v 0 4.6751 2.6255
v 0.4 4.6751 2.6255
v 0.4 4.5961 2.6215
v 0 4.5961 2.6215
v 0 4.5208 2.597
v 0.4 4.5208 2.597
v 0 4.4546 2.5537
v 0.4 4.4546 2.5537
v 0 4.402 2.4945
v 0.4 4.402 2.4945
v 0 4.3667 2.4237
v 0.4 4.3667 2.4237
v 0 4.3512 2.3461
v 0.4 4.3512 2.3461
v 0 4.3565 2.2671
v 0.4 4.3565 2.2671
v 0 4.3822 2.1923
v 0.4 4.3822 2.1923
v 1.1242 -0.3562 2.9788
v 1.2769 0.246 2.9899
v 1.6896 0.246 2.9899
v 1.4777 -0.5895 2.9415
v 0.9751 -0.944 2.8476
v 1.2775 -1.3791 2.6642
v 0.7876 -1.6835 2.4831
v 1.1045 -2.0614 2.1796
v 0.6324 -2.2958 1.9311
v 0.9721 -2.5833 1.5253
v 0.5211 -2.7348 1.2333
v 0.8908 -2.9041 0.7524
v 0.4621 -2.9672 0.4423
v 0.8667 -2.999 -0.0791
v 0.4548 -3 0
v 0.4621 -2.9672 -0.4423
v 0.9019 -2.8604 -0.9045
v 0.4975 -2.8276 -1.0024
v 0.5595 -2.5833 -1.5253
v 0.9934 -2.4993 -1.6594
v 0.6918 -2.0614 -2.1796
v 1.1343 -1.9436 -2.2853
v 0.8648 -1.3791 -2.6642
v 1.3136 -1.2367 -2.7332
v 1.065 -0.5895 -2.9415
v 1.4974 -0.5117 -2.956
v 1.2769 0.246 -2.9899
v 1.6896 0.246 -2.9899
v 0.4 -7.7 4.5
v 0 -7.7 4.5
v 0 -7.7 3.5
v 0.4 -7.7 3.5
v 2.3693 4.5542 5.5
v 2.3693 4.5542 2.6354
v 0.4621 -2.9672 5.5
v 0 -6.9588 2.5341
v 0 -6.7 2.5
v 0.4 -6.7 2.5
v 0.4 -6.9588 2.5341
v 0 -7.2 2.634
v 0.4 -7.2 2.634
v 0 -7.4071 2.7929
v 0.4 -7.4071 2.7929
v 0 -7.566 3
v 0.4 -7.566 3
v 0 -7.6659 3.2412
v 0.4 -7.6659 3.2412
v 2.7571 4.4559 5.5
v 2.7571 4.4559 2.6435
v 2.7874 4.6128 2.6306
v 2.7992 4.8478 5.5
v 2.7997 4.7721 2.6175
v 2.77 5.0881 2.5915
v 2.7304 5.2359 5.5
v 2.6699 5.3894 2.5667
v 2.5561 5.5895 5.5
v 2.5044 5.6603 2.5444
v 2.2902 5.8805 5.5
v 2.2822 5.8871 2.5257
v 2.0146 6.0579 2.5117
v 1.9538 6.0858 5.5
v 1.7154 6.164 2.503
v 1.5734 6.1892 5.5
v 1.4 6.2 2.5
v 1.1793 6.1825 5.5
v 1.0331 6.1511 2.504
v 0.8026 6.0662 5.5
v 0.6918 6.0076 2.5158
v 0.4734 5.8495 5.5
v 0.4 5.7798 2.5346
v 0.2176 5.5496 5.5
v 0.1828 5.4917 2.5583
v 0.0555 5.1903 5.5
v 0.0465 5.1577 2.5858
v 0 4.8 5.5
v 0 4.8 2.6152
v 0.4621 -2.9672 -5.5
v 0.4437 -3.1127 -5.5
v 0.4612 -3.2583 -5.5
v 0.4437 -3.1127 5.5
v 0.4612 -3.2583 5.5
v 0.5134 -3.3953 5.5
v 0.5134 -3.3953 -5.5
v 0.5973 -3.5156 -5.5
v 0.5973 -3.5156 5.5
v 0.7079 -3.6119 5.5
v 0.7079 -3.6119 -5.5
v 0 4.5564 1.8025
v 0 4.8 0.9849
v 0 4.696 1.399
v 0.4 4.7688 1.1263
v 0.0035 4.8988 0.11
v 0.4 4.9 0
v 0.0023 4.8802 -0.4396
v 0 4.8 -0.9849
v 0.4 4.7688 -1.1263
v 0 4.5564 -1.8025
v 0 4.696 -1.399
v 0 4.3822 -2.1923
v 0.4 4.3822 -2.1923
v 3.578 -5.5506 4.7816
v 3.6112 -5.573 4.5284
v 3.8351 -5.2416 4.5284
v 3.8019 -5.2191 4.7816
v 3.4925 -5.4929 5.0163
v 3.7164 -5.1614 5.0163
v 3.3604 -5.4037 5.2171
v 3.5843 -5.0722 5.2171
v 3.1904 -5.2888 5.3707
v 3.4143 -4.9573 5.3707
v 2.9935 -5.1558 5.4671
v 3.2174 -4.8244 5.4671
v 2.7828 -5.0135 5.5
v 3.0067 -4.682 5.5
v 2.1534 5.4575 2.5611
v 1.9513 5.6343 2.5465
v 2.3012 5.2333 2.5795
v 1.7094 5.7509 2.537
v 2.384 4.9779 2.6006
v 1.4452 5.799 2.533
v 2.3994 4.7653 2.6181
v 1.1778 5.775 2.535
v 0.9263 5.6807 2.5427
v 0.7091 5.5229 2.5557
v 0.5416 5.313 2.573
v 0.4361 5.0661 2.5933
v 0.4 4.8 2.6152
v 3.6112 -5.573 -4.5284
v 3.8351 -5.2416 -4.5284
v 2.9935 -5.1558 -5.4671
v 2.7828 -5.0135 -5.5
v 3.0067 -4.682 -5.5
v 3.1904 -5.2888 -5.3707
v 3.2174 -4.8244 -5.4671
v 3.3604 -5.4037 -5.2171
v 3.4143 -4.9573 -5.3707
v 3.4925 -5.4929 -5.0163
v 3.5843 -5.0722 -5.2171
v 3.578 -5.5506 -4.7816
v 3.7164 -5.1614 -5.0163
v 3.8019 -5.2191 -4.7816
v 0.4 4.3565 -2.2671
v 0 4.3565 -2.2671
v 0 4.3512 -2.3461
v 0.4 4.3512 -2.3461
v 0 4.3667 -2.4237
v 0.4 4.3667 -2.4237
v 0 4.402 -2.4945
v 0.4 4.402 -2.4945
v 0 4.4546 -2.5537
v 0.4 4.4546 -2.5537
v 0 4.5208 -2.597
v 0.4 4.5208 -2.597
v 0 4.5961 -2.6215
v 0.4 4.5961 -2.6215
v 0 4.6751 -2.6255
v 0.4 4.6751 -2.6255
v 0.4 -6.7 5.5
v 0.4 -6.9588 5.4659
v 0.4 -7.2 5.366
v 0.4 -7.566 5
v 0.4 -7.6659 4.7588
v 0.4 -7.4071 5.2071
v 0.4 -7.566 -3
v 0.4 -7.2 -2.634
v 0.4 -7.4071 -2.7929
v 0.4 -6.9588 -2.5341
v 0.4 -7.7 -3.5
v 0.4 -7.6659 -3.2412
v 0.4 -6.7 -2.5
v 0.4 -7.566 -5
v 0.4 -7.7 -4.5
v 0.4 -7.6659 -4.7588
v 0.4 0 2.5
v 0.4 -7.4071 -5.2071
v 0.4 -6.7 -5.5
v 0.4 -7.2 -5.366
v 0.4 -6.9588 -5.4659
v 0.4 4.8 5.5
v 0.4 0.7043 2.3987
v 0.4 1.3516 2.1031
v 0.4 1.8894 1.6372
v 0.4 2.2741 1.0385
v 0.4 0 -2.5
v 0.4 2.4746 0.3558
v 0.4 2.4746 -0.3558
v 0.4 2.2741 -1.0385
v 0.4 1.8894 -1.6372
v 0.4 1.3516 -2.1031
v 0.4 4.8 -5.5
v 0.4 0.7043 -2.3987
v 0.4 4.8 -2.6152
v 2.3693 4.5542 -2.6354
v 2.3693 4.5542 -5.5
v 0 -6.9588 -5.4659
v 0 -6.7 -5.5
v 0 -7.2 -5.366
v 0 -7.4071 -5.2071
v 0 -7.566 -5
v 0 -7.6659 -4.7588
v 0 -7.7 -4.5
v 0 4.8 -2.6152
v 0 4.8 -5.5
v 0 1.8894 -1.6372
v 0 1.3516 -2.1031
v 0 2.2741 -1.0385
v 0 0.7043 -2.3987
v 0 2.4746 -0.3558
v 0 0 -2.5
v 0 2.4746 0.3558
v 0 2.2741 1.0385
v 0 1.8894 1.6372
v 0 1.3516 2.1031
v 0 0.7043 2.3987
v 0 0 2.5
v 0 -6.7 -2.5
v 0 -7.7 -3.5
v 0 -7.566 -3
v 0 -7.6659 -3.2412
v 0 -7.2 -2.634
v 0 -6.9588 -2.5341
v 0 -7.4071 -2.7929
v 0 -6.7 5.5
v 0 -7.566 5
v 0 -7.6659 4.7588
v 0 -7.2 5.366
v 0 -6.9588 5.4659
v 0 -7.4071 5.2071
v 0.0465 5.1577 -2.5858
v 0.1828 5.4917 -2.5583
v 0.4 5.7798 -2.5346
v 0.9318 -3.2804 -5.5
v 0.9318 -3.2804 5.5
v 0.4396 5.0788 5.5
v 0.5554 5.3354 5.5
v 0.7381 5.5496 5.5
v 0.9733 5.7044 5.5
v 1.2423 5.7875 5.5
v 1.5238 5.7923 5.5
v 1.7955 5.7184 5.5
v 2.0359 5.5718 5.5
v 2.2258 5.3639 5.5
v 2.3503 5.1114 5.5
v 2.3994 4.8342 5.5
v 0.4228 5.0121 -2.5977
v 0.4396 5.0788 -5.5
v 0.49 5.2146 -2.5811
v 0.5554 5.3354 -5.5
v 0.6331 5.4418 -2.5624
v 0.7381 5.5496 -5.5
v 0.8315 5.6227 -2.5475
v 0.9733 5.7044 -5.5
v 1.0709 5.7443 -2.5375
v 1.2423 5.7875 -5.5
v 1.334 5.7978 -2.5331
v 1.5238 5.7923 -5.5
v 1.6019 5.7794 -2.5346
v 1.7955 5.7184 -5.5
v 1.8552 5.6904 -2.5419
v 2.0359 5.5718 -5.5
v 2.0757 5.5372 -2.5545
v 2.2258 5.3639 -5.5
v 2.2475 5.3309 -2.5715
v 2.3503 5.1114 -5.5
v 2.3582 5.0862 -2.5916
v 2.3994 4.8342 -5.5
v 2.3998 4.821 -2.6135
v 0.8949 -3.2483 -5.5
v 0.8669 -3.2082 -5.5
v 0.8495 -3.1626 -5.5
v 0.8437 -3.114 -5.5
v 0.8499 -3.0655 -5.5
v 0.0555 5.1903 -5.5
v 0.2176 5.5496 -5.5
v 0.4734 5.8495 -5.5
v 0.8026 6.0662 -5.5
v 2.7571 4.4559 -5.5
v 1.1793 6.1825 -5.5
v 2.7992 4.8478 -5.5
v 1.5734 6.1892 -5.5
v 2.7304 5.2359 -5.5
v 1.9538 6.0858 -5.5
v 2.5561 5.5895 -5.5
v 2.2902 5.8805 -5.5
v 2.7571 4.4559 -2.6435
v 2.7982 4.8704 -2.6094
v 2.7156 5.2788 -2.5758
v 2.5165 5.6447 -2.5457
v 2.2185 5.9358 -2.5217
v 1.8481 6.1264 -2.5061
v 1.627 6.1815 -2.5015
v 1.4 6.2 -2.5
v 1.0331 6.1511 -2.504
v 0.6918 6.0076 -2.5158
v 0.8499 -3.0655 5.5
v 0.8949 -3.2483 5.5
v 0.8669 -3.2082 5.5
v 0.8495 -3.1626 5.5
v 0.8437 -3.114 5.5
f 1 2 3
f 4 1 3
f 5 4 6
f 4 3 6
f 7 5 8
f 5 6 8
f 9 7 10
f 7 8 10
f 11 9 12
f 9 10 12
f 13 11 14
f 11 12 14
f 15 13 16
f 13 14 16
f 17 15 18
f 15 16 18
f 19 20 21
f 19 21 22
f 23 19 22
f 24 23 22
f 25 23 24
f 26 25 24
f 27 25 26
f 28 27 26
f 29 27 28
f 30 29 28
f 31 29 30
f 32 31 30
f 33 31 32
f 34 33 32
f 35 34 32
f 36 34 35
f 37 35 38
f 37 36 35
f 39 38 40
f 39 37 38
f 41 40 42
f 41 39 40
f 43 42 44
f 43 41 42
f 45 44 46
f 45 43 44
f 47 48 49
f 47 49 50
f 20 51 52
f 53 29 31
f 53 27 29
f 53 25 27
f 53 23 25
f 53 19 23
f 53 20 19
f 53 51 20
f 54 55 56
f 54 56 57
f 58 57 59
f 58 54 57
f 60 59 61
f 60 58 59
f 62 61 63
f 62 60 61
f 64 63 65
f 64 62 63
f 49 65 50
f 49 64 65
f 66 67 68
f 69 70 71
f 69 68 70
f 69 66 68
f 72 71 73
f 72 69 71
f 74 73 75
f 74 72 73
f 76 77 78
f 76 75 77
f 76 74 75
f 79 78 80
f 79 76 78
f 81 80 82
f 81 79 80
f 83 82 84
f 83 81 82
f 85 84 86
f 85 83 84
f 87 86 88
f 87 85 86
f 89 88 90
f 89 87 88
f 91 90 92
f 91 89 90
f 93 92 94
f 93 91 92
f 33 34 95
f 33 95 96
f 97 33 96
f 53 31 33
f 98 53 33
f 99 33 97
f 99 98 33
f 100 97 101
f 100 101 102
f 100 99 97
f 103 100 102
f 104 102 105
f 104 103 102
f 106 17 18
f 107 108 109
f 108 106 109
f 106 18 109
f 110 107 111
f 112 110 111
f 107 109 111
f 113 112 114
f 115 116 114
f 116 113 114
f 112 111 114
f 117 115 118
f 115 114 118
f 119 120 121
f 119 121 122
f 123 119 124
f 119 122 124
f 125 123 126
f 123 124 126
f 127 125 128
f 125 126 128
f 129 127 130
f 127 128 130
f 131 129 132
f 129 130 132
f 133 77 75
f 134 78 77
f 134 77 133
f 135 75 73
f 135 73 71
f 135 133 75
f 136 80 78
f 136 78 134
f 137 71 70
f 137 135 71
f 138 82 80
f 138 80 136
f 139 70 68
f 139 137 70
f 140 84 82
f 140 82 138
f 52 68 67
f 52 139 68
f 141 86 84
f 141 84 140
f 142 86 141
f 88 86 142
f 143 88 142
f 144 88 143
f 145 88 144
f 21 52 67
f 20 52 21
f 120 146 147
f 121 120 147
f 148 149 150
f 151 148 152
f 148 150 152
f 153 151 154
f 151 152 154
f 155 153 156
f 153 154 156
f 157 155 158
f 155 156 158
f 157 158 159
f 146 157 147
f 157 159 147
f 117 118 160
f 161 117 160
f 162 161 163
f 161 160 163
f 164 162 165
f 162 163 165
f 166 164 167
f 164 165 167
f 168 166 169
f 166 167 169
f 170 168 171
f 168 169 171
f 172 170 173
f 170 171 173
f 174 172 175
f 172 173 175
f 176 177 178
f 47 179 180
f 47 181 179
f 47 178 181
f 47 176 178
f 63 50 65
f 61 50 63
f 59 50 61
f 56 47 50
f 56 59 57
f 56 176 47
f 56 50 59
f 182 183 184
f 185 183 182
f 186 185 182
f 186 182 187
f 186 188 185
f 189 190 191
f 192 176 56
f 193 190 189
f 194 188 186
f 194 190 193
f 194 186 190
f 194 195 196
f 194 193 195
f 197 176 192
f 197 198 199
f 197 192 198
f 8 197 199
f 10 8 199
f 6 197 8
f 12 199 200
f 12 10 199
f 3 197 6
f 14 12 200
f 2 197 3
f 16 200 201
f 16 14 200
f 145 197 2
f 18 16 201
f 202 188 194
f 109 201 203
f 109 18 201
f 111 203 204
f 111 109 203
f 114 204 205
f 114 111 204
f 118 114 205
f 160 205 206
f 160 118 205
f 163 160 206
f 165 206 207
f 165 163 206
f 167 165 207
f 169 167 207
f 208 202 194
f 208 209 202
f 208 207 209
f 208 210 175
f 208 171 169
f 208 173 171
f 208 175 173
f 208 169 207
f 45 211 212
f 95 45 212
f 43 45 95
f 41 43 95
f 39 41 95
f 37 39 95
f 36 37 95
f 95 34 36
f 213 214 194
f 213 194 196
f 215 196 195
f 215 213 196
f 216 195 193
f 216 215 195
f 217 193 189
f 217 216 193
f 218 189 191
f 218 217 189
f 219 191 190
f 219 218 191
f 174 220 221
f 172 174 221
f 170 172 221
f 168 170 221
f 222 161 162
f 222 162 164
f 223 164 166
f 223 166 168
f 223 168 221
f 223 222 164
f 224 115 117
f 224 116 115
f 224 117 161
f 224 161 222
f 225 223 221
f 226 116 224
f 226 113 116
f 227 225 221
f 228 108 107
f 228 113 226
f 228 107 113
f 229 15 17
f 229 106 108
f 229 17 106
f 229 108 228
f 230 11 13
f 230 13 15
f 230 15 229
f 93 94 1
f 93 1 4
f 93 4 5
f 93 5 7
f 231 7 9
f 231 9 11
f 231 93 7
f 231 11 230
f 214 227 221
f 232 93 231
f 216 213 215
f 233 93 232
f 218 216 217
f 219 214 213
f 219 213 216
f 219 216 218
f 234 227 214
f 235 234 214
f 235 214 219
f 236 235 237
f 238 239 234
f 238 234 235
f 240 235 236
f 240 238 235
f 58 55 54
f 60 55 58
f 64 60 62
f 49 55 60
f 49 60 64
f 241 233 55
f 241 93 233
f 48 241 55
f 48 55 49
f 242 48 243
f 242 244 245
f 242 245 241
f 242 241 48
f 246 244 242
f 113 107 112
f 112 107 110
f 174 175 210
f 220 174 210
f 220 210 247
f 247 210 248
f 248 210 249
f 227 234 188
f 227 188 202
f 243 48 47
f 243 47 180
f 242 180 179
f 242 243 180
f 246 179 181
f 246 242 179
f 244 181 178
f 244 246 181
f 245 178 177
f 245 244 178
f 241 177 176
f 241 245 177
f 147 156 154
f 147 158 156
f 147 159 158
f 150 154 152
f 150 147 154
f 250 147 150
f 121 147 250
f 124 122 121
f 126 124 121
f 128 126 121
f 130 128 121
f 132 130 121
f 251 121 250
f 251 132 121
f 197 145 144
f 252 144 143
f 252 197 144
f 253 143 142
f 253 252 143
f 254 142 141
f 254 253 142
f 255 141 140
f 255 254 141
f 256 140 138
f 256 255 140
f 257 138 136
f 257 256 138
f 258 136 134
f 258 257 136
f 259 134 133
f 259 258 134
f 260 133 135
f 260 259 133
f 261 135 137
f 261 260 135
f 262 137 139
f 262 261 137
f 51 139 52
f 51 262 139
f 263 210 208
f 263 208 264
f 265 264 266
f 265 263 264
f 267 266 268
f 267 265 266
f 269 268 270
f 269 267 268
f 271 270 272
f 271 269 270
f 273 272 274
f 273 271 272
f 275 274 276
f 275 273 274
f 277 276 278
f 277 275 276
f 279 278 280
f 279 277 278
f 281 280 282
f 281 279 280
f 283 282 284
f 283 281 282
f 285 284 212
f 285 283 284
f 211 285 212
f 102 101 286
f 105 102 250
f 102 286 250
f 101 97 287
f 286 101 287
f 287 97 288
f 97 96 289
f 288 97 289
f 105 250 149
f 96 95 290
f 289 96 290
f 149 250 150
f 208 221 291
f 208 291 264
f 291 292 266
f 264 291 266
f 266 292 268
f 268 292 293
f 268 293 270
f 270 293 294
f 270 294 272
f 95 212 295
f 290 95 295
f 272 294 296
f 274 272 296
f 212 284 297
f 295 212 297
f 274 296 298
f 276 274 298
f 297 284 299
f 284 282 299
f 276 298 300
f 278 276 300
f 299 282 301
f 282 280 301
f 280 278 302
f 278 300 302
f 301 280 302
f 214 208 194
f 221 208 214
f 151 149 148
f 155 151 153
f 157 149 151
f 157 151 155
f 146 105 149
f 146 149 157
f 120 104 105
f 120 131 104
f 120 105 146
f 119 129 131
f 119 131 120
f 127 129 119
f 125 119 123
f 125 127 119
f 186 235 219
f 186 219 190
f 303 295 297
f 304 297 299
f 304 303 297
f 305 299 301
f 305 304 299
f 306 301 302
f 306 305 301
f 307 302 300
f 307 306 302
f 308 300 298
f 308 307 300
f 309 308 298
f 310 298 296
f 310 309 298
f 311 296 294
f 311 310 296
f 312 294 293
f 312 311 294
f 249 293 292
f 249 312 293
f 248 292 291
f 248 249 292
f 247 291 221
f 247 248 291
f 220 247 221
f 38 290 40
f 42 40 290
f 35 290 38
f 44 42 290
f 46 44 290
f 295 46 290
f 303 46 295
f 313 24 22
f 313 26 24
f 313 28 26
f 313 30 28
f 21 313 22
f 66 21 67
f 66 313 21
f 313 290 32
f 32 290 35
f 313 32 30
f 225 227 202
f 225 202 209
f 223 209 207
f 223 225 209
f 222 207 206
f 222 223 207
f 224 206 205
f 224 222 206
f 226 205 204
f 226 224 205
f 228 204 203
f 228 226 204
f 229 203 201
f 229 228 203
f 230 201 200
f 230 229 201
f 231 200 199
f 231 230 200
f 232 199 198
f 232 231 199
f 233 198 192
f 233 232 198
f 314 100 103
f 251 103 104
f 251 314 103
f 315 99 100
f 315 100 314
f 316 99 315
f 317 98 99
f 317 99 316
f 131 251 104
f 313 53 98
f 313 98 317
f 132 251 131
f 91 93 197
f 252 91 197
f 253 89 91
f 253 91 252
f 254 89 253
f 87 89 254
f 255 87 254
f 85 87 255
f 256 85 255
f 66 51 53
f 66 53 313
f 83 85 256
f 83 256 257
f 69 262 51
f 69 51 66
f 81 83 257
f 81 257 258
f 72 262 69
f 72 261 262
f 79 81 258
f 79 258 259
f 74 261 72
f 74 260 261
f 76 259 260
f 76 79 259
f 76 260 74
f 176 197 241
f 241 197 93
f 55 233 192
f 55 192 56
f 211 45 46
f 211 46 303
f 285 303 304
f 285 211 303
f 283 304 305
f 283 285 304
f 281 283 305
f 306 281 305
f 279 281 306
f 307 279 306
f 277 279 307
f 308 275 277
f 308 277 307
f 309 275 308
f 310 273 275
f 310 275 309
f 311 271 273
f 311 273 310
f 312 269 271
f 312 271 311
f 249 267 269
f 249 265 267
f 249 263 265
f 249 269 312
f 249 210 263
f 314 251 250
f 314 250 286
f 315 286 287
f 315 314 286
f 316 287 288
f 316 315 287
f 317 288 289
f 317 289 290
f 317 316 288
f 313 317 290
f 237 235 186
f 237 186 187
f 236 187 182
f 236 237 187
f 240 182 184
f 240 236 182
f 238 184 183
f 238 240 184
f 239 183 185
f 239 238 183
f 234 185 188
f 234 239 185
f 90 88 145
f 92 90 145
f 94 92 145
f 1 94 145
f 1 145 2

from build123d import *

# Parameters (mm, degrees)
BOSS_EXTRUDE1_DEPTH      = 5.5
BOSS_EXTRUDE1_DEPTH_BACK = 5.5
CUT_EXTRUDE1_DEPTH       = 0.4
CUT_EXTRUDE2_DEPTH       = 3.8
CUT_EXTRUDE3_DEPTH       = 3.8
CUT_EXTRUDE4_DEPTH       = 0.4
CUT_EXTRUDE5_DEPTH       = 0.4
CUT_EXTRUDE6_DEPTH       = 0.4
CUT_EXTRUDE7_DEPTH       = 0.4
CUT_EXTRUDE8_DEPTH       = 0.8
CUT_EXTRUDE8_DEPTH_BACK  = 0.8


with BuildPart() as part:
    # Sketch1 → Boss-Extrude1 (new, two sides: drawn at the far end of the back side and taken through both)
    with BuildSketch(Plane.XY.offset(-BOSS_EXTRUDE1_DEPTH_BACK)):
        with BuildLine():
            Line((0, 4.8), (0, -7.7))
            Line((0, -7.7), (0.4, -7.7))
            Line((0.4, -7.7), (0.4, 4.8))
            ThreePointArc((0.4, 4.8), (1.523848484, 5.79230114), (2.369323106, 4.554210017))
            Line((2.369323106, 4.554210017), (0.462124676, -2.967217351))
            ThreePointArc((0.462124676, -2.967217351), (0.483070792, -3.328406344), (0.707868785, -3.611888427))
            Line((0.707868785, -3.611888427), (3.611166589, -5.573025933))
            Line((3.611166589, -5.573025933), (3.835066425, -5.241561209))
            Line((3.835066425, -5.241561209), (0.931768621, -3.280423703))
            ThreePointArc((0.931768621, -3.280423703), (0.856835957, -3.185929675), (0.849853918, -3.065533344))
            Line((0.849853918, -3.065533344), (2.757052349, 4.455894023))
            ThreePointArc((2.757052349, 4.455894023), (1.573387877, 6.189221596), (0, 4.8))
        make_face()
    extrude(amount=BOSS_EXTRUDE1_DEPTH + BOSS_EXTRUDE1_DEPTH_BACK)

    # Sketch2 → Cut-Extrude1 (cut)
    with BuildSketch(Plane(origin=(0, 0, 0), x_dir=(0, 0, -1), z_dir=(1, 0, 0))):
        with BuildLine():
            Line((-2.5, 0), (-2.5, -7.7))
            Line((-2.5, -7.7), (2.5, -7.7))
            Line((2.5, -7.7), (2.5, 0))
            ThreePointArc((2.5, 0), (0, 2.5), (-2.5, 0))
        make_face()
    extrude(amount=CUT_EXTRUDE1_DEPTH, mode=Mode.SUBTRACT)

    # Sketch3 → Cut-Extrude2 (cut)
    with BuildSketch(Plane(origin=(0.4, 0, 0), x_dir=(0, 0, -1), z_dir=(1, 0, 0))):
        with BuildLine():
            Line((2.989896199, 0.246009597), (2.5, 6.2))
            Line((2.5, 6.2), (-2.5, 6.2))
            Line((-2.5, 6.2), (-2.989896199, 0.246009597))
            ThreePointArc((-2.989896199, 0.246009597), (0, -3), (2.989896199, 0.246009597))
        make_face()
    extrude(amount=CUT_EXTRUDE2_DEPTH, mode=Mode.SUBTRACT)

    # Sketch4 → Cut-Extrude3 (cut)
    with BuildSketch(Plane(origin=(0.4, 0, 0), x_dir=(0, 0, -1), z_dir=(1, 0, 0))):
        with BuildLine():
            Line((2.62546601, 4.675139381), (2.5, 6.2))
            Line((2.5, 6.2), (-2.5, 6.2))
            Line((-2.5, 6.2), (-2.62546601, 4.675139381))
            ThreePointArc((-2.62546601, 4.675139381), (-2.494509309, 4.402012893), (-2.192256609, 4.382238122))
            ThreePointArc((-2.192256609, 4.382238122), (-6e-09, 4.9), (2.192256599, 4.382238127))
            ThreePointArc((2.192256599, 4.382238127), (2.494509304, 4.402012889), (2.62546601, 4.675139381))
        make_face()
    extrude(amount=-CUT_EXTRUDE3_DEPTH, mode=Mode.SUBTRACT)

    # Sketch5 → Cut-Extrude4 (cut)
    with BuildSketch(Plane(origin=(0, 0, 0), x_dir=(0, 0, -1), z_dir=(1, 0, 0))):
        with BuildLine():
            Line((-5.5, -7.7), (-4.5, -7.7))
            ThreePointArc((-4.5, -7.7), (-5.207106781, -7.407106781), (-5.5, -6.7))
            Line((-5.5, -6.7), (-5.5, -7.7))
        make_face()
    extrude(amount=CUT_EXTRUDE4_DEPTH, mode=Mode.SUBTRACT)

    # Sketch6 → Cut-Extrude5 (cut)
    with BuildSketch(Plane(origin=(0, 0, 0), x_dir=(0, 0, -1), z_dir=(1, 0, 0))):
        with BuildLine():
            Line((4.5, -7.7), (5.5, -7.7))
            Line((5.5, -7.7), (5.5, -6.7))
            ThreePointArc((5.5, -6.7), (5.207106781, -7.407106781), (4.5, -7.7))
        make_face()
    extrude(amount=CUT_EXTRUDE5_DEPTH, mode=Mode.SUBTRACT)

    # Sketch7 → Cut-Extrude6 (cut)
    with BuildSketch(Plane(origin=(0, 0, 0), x_dir=(0, 0, -1), z_dir=(1, 0, 0))):
        with BuildLine():
            Line((2.5, -7.7), (3.5, -7.7))
            ThreePointArc((3.5, -7.7), (2.792893219, -7.407106781), (2.5, -6.7))
            Line((2.5, -6.7), (2.5, -7.7))
        make_face()
    extrude(amount=CUT_EXTRUDE6_DEPTH, mode=Mode.SUBTRACT)

    # Sketch8 → Cut-Extrude7 (cut)
    with BuildSketch(Plane(origin=(0, 0, 0), x_dir=(0, 0, -1), z_dir=(1, 0, 0))):
        with BuildLine():
            Line((-3.5, -7.7), (-2.5, -7.7))
            Line((-2.5, -7.7), (-2.5, -6.7))
            ThreePointArc((-2.5, -6.7), (-2.792893219, -7.407106781), (-3.5, -7.7))
        make_face()
    extrude(amount=CUT_EXTRUDE7_DEPTH, mode=Mode.SUBTRACT)

    # Sketch9 → Cut-Extrude8 (cut, two sides: drawn at the far end of the back side and taken through both)
    with BuildSketch(Plane(origin=(-1.229660553, -1.820408193, 0), x_dir=(0.8286618104657849, -0.5597495903308619, 0), z_dir=(0.5597495903308619, 0.8286618104657849, 0)).offset(-CUT_EXTRUDE8_DEPTH_BACK)):
        with BuildLine():
            Line((6.112336896, 4.5), (6.112336896, -4.5))
            ThreePointArc((6.112336896, -4.5), (5.819443678, -5.207106781), (5.112336896, -5.5))
            Line((5.112336896, -5.5), (5.112336896, -6.5))
            Line((5.112336896, -6.5), (7.112336896, -6.5))
            Line((7.112336896, -6.5), (7.112336896, 6.5))
            Line((7.112336896, 6.5), (5.112336896, 6.5))
            Line((5.112336896, 6.5), (5.112336896, 5.5))
            ThreePointArc((5.112336896, 5.5), (5.819443678, 5.207106781), (6.112336896, 4.5))
        make_face()
    extrude(amount=CUT_EXTRUDE8_DEPTH + CUT_EXTRUDE8_DEPTH_BACK, mode=Mode.SUBTRACT)


solid = part.part
